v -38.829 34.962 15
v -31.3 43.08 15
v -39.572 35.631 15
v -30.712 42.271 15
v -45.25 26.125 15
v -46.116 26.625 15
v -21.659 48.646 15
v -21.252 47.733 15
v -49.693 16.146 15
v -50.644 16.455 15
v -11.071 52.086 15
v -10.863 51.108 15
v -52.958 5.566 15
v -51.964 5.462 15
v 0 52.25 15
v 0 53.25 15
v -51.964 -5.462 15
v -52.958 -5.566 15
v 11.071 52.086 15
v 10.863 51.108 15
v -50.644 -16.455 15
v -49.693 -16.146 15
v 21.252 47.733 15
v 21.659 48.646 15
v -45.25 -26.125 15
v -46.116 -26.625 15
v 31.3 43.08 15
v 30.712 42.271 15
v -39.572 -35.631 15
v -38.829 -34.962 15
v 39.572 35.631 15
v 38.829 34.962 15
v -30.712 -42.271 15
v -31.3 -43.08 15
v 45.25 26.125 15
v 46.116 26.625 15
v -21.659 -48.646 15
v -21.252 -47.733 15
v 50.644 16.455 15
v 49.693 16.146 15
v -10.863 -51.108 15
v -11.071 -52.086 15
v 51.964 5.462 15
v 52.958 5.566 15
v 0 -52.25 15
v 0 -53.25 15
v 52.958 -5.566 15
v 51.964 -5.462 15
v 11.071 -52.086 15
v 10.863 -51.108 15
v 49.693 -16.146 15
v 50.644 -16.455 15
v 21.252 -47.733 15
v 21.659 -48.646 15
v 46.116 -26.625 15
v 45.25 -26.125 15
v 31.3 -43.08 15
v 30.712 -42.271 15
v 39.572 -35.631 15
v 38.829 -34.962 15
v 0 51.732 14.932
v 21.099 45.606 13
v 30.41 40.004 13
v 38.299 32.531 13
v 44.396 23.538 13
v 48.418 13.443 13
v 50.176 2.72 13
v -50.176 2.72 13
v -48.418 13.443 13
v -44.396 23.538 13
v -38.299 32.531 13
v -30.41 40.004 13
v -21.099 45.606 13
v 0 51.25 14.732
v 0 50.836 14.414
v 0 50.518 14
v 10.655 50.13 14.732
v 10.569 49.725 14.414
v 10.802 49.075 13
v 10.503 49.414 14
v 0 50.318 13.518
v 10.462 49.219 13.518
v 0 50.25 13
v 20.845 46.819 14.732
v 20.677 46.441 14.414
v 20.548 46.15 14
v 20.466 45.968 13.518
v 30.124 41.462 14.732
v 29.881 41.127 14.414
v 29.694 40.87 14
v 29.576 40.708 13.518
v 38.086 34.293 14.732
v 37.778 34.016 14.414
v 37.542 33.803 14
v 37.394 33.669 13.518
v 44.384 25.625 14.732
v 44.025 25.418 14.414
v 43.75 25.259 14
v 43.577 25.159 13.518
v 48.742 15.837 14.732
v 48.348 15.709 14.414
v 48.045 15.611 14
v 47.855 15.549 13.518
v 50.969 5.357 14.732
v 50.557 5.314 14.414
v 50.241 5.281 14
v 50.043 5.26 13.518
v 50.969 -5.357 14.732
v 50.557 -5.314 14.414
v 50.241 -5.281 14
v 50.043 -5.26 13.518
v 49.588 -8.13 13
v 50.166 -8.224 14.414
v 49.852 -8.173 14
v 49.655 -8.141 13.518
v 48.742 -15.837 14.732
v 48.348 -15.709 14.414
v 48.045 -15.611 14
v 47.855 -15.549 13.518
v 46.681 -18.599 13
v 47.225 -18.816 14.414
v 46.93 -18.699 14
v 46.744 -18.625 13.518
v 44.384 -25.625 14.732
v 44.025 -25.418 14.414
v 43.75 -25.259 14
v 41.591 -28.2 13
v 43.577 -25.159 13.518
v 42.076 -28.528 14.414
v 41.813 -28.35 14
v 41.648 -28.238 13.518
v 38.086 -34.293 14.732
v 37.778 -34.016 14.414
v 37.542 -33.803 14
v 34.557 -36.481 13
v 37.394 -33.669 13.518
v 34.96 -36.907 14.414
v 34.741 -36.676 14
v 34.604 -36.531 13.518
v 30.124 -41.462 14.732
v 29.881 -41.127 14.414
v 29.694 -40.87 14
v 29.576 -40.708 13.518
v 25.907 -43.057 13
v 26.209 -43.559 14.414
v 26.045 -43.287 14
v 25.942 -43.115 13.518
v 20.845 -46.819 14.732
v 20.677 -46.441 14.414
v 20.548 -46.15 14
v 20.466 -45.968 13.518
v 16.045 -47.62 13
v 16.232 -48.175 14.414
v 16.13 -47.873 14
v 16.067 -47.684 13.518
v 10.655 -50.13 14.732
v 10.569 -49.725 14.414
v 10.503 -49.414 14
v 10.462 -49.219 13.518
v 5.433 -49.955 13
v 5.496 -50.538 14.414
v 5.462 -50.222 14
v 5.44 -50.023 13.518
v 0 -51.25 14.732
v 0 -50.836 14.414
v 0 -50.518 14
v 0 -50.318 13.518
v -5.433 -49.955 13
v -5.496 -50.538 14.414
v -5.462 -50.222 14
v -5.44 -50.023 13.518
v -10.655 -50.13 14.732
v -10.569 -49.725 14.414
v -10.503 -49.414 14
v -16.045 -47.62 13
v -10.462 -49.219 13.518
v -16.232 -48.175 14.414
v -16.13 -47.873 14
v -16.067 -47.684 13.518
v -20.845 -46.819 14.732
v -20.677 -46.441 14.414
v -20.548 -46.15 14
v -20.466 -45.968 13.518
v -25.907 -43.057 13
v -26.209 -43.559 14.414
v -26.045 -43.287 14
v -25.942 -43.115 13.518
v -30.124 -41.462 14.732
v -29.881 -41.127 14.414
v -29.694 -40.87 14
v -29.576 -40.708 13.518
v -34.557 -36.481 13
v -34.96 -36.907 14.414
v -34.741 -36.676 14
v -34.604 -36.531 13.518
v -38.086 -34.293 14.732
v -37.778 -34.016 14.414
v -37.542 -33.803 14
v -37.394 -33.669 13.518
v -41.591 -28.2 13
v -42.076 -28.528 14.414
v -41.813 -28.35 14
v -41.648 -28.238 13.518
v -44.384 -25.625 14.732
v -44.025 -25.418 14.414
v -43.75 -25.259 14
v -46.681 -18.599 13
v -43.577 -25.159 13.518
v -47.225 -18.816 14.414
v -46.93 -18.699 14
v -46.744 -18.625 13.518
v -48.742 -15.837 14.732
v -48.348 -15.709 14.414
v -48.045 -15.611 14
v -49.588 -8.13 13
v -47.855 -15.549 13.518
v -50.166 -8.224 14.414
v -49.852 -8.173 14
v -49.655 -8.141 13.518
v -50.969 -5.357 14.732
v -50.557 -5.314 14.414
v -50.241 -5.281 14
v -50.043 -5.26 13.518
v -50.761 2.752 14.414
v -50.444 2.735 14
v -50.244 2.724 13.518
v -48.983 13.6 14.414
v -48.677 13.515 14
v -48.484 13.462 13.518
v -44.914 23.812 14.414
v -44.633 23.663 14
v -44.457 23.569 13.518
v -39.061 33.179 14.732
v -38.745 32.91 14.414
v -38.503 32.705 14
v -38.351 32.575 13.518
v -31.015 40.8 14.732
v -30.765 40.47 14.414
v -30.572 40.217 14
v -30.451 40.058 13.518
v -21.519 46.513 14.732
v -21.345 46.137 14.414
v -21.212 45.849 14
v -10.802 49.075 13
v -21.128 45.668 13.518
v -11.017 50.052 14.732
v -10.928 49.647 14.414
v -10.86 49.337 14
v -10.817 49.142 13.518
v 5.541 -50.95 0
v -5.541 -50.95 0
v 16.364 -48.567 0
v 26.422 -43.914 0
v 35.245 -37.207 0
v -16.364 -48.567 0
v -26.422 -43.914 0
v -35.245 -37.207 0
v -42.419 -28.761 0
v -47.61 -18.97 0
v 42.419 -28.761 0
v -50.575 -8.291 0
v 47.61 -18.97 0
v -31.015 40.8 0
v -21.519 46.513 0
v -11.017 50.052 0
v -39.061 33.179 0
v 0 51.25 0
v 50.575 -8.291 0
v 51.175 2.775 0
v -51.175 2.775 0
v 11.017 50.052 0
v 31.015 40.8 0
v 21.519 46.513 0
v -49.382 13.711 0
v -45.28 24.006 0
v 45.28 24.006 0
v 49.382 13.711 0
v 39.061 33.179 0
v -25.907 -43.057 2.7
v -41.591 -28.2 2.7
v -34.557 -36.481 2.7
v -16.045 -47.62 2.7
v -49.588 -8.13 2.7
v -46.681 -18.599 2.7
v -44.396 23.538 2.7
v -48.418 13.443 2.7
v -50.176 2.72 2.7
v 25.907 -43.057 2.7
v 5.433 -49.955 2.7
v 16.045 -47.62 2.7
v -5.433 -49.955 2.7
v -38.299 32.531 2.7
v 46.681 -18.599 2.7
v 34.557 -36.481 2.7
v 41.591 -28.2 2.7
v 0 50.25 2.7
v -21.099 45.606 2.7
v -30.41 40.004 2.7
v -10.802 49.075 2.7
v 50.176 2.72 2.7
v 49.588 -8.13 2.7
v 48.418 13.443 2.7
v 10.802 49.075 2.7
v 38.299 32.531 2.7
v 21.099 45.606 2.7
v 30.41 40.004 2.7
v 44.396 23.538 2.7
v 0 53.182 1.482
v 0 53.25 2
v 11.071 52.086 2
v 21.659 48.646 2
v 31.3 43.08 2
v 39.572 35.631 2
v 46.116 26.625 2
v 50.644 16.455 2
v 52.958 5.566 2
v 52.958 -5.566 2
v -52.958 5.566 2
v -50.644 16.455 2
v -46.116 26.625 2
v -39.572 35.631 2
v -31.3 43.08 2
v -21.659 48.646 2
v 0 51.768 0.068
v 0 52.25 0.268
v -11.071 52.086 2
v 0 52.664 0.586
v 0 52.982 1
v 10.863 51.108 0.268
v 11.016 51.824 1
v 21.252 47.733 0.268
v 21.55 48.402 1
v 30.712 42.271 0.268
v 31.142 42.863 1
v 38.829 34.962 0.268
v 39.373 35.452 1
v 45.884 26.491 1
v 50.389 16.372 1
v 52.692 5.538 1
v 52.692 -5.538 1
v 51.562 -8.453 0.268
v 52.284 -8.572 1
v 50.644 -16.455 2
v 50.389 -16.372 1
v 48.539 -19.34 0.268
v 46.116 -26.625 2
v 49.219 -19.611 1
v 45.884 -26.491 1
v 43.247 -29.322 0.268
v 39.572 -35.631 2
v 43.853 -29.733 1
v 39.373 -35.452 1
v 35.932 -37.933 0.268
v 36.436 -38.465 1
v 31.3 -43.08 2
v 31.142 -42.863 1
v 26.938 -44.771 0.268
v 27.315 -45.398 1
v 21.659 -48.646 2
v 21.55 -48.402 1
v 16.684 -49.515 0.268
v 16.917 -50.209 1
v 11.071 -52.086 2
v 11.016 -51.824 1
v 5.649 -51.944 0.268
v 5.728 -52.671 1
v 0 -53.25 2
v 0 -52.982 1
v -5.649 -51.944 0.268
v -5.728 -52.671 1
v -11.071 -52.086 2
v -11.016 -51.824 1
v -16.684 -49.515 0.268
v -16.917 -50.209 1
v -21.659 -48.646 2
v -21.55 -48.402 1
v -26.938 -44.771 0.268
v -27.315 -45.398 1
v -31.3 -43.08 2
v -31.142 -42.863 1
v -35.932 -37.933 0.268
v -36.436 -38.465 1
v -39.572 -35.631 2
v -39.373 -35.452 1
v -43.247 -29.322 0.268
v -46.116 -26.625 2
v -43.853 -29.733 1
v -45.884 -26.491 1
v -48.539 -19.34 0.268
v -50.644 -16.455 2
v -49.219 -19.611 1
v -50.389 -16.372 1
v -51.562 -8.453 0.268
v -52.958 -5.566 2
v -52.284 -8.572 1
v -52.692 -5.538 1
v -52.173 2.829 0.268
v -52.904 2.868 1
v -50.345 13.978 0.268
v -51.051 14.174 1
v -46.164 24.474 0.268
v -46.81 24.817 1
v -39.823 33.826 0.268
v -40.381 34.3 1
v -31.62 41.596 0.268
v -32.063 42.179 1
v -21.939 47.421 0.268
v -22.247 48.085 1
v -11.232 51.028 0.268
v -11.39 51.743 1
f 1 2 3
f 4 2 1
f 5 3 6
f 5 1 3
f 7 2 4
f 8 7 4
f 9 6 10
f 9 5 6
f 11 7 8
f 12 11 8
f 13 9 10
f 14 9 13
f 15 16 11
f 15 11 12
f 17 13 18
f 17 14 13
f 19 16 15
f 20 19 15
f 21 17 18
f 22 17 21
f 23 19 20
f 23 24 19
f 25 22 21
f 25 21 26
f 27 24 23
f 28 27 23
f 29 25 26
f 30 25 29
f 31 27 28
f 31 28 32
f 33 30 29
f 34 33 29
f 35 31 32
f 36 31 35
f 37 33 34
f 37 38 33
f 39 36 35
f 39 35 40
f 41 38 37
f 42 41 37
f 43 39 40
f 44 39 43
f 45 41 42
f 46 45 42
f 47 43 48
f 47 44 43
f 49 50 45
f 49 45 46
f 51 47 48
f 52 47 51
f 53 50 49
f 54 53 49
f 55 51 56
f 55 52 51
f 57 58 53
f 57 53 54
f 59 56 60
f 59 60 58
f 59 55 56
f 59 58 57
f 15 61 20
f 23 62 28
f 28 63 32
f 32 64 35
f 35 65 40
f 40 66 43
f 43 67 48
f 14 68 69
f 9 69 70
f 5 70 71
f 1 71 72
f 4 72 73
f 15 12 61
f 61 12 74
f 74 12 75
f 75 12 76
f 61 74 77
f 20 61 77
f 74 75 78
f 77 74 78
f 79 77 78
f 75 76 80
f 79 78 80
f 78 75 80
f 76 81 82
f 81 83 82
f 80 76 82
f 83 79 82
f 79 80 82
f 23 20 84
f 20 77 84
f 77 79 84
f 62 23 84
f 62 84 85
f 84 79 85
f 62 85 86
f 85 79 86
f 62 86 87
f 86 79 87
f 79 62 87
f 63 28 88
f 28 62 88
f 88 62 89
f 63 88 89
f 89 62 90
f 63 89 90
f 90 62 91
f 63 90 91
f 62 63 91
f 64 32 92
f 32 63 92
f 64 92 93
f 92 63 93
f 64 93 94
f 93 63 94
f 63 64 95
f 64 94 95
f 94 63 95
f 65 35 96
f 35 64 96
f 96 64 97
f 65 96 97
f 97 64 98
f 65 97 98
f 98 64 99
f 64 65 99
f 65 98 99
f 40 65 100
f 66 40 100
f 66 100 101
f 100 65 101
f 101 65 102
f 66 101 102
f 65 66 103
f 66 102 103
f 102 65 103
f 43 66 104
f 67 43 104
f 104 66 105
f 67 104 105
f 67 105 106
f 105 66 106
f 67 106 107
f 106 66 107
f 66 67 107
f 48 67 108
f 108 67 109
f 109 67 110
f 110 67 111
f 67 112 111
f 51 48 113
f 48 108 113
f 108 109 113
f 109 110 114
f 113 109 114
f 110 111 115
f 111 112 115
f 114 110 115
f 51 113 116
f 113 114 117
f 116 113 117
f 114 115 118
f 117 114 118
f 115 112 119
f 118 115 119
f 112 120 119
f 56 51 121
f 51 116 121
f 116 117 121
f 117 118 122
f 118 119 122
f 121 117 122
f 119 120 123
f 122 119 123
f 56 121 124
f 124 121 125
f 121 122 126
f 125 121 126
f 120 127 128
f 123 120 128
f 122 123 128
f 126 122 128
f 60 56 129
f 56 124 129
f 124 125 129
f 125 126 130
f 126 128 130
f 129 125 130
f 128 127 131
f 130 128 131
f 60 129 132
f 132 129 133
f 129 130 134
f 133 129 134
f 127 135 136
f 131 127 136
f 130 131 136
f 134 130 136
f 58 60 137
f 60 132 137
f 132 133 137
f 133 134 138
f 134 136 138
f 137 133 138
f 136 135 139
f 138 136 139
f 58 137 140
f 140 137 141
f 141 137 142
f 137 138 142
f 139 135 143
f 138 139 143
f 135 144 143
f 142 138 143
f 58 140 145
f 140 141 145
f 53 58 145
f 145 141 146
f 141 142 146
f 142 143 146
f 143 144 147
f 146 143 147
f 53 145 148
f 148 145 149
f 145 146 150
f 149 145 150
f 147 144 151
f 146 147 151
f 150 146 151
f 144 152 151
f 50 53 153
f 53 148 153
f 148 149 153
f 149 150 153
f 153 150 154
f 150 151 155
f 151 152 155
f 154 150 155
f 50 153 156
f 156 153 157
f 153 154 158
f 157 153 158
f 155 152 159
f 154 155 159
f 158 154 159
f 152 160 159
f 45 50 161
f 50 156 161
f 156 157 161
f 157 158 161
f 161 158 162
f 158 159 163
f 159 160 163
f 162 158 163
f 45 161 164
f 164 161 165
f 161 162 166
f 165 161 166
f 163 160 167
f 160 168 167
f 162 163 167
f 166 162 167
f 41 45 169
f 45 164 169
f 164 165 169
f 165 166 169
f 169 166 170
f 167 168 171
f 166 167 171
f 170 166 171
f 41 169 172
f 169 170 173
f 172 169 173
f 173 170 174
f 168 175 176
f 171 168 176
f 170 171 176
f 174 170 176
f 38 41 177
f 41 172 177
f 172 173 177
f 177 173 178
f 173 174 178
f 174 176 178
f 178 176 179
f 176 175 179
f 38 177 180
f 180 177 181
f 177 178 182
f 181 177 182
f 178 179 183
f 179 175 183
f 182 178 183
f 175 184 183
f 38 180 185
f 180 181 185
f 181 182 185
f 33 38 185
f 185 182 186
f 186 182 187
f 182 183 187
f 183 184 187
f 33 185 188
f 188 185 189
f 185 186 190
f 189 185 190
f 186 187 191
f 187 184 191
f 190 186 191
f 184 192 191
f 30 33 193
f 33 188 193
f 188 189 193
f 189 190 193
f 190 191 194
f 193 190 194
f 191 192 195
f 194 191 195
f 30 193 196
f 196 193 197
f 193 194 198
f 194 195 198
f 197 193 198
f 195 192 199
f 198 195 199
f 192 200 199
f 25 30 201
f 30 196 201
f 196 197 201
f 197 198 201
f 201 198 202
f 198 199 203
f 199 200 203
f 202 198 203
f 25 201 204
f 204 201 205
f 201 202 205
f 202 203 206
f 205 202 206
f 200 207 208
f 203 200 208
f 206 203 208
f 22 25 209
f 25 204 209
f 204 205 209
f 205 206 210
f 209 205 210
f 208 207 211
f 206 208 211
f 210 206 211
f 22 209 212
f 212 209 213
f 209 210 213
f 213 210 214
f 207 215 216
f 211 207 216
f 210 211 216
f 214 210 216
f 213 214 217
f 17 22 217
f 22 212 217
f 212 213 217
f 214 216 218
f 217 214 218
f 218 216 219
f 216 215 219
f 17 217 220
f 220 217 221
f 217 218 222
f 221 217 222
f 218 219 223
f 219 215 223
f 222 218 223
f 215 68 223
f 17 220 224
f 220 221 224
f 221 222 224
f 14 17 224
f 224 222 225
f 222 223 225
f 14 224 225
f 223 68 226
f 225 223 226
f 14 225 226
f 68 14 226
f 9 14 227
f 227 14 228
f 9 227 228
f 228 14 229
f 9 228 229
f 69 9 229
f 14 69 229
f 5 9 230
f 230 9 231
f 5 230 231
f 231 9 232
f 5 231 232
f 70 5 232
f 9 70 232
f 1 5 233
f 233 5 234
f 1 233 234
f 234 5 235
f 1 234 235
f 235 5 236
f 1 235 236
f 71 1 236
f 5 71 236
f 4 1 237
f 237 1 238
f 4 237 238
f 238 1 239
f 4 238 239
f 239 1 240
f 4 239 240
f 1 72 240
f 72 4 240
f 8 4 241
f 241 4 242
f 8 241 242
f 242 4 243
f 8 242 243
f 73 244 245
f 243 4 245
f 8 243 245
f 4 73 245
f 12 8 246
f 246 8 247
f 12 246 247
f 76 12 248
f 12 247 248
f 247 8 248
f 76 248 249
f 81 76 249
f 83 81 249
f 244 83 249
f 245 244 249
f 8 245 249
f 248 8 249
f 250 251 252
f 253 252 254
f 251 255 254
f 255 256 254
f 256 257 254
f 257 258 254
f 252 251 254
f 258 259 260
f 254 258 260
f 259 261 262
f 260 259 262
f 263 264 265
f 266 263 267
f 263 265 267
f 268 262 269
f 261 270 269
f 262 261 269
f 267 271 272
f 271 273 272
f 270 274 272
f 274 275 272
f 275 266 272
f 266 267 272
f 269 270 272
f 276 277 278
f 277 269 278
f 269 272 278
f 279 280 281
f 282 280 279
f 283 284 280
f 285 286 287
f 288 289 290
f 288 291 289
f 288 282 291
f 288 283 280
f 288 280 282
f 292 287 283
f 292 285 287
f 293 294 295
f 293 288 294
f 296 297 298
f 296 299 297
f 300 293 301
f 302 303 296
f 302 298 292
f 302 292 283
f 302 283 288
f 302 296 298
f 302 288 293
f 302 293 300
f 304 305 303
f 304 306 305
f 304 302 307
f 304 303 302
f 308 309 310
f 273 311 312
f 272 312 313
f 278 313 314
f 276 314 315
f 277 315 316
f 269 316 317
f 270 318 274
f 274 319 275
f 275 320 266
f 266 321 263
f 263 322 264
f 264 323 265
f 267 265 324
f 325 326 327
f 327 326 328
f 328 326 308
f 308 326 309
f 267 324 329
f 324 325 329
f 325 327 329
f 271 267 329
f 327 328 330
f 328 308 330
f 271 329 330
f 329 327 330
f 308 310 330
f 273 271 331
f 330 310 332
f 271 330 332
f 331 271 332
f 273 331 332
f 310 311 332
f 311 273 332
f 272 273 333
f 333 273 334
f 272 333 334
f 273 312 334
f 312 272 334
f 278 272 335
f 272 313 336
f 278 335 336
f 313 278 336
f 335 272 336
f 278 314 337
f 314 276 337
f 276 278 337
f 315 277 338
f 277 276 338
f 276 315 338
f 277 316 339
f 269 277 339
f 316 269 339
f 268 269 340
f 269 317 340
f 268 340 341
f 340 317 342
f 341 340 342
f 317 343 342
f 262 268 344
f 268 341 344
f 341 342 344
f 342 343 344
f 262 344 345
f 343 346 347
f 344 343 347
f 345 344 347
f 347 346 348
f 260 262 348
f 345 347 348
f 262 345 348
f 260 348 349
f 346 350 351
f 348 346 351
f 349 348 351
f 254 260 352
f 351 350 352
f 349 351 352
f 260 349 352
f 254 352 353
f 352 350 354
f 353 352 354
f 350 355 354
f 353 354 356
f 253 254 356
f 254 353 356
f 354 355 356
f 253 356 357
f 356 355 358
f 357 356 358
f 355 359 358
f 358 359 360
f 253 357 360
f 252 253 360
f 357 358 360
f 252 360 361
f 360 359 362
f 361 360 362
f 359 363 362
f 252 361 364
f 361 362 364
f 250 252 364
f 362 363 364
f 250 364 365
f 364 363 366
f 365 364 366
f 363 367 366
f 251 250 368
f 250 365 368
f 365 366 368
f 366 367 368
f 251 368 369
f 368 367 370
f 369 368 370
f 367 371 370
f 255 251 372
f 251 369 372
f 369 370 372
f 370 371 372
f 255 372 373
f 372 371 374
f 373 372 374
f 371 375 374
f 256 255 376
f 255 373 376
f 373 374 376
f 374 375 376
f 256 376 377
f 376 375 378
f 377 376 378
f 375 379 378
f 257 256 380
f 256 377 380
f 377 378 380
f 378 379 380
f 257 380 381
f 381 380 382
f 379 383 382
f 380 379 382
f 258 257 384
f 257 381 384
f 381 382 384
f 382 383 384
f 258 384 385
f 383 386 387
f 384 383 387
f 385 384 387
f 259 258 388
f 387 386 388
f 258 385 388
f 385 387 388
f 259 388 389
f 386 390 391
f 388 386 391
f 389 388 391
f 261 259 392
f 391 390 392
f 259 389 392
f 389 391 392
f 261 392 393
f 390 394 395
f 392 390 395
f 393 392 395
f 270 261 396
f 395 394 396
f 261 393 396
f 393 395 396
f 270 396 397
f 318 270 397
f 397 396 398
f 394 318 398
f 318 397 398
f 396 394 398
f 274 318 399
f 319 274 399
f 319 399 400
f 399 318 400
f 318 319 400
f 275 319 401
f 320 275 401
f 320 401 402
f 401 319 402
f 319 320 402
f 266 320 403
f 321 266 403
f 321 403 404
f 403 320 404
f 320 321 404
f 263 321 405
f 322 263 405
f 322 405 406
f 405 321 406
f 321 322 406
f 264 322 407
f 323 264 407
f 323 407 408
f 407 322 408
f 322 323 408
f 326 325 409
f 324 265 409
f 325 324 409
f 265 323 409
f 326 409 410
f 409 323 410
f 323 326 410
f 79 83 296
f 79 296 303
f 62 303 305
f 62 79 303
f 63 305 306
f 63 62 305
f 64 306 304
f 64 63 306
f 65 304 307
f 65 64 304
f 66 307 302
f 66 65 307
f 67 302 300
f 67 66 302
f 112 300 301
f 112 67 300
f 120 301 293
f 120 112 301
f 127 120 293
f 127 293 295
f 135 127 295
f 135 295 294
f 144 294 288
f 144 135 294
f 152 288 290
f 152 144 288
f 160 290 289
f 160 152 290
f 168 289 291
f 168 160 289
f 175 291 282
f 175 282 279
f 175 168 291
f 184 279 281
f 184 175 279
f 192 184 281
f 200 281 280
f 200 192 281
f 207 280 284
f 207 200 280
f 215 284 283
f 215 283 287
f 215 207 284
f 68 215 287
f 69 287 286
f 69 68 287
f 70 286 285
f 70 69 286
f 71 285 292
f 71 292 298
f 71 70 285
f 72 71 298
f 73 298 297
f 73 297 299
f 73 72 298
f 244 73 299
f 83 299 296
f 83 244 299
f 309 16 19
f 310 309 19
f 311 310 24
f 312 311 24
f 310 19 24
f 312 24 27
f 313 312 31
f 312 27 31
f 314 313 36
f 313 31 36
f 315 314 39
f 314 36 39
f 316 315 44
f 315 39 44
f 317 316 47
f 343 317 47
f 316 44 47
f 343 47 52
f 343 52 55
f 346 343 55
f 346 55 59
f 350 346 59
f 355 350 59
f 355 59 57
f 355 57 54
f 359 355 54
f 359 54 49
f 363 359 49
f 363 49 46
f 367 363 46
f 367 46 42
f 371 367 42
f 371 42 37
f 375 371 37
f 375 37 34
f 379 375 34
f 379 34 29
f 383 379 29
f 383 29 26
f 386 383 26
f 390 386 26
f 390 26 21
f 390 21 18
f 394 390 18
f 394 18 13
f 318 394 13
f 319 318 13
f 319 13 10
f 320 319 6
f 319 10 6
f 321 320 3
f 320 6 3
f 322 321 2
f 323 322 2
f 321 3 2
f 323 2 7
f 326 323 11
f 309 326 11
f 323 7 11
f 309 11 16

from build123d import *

# Parameters (mm, degrees)
SKETCH_R         = 53
PAD_DEPTH        = 2.7
SKETCH001_W      = 3
SKETCH001_H      = 15
REVOLUTION_ANGLE = 360
FILLET_R         = 2
FILLET001_R      = 2


with BuildPart() as part:
    # Sketch → Pad (new body)
    with BuildSketch(Plane.XY):
        Circle(SKETCH_R)
    extrude(amount=PAD_DEPTH)

    # Sketch001 → Revolution (revolve, symmetric)
    with BuildSketch(Plane(origin=(0, 50.25, 0), x_dir=(0, 1, 0), z_dir=(1, 0, 0))) as revolution_sk:
        with Locations((1.5, 7.5)):
            Rectangle(SKETCH001_W, SKETCH001_H)
    revolve(axis=Axis((0, 0, 0), (0, 0, 1)), revolution_arc=REVOLUTION_ANGLE / 2)
    revolve(revolution_sk.sketch, axis=Axis((0, 0, 0), (0, 0, -1)), revolution_arc=REVOLUTION_ANGLE / 2)

    # Fillet
    fillet_edges = [part.edges().sort_by_distance(p)[0] for p in [
        (0, 53.25, 0),
    ]]
    fillet(fillet_edges, radius=FILLET_R)

    # Fillet001
    fillet001_edges = [part.edges().sort_by_distance(p)[0] for p in [
        (0, 50.25, 15),
    ]]
    fillet(fillet001_edges, radius=FILLET001_R)


solid = part.part
